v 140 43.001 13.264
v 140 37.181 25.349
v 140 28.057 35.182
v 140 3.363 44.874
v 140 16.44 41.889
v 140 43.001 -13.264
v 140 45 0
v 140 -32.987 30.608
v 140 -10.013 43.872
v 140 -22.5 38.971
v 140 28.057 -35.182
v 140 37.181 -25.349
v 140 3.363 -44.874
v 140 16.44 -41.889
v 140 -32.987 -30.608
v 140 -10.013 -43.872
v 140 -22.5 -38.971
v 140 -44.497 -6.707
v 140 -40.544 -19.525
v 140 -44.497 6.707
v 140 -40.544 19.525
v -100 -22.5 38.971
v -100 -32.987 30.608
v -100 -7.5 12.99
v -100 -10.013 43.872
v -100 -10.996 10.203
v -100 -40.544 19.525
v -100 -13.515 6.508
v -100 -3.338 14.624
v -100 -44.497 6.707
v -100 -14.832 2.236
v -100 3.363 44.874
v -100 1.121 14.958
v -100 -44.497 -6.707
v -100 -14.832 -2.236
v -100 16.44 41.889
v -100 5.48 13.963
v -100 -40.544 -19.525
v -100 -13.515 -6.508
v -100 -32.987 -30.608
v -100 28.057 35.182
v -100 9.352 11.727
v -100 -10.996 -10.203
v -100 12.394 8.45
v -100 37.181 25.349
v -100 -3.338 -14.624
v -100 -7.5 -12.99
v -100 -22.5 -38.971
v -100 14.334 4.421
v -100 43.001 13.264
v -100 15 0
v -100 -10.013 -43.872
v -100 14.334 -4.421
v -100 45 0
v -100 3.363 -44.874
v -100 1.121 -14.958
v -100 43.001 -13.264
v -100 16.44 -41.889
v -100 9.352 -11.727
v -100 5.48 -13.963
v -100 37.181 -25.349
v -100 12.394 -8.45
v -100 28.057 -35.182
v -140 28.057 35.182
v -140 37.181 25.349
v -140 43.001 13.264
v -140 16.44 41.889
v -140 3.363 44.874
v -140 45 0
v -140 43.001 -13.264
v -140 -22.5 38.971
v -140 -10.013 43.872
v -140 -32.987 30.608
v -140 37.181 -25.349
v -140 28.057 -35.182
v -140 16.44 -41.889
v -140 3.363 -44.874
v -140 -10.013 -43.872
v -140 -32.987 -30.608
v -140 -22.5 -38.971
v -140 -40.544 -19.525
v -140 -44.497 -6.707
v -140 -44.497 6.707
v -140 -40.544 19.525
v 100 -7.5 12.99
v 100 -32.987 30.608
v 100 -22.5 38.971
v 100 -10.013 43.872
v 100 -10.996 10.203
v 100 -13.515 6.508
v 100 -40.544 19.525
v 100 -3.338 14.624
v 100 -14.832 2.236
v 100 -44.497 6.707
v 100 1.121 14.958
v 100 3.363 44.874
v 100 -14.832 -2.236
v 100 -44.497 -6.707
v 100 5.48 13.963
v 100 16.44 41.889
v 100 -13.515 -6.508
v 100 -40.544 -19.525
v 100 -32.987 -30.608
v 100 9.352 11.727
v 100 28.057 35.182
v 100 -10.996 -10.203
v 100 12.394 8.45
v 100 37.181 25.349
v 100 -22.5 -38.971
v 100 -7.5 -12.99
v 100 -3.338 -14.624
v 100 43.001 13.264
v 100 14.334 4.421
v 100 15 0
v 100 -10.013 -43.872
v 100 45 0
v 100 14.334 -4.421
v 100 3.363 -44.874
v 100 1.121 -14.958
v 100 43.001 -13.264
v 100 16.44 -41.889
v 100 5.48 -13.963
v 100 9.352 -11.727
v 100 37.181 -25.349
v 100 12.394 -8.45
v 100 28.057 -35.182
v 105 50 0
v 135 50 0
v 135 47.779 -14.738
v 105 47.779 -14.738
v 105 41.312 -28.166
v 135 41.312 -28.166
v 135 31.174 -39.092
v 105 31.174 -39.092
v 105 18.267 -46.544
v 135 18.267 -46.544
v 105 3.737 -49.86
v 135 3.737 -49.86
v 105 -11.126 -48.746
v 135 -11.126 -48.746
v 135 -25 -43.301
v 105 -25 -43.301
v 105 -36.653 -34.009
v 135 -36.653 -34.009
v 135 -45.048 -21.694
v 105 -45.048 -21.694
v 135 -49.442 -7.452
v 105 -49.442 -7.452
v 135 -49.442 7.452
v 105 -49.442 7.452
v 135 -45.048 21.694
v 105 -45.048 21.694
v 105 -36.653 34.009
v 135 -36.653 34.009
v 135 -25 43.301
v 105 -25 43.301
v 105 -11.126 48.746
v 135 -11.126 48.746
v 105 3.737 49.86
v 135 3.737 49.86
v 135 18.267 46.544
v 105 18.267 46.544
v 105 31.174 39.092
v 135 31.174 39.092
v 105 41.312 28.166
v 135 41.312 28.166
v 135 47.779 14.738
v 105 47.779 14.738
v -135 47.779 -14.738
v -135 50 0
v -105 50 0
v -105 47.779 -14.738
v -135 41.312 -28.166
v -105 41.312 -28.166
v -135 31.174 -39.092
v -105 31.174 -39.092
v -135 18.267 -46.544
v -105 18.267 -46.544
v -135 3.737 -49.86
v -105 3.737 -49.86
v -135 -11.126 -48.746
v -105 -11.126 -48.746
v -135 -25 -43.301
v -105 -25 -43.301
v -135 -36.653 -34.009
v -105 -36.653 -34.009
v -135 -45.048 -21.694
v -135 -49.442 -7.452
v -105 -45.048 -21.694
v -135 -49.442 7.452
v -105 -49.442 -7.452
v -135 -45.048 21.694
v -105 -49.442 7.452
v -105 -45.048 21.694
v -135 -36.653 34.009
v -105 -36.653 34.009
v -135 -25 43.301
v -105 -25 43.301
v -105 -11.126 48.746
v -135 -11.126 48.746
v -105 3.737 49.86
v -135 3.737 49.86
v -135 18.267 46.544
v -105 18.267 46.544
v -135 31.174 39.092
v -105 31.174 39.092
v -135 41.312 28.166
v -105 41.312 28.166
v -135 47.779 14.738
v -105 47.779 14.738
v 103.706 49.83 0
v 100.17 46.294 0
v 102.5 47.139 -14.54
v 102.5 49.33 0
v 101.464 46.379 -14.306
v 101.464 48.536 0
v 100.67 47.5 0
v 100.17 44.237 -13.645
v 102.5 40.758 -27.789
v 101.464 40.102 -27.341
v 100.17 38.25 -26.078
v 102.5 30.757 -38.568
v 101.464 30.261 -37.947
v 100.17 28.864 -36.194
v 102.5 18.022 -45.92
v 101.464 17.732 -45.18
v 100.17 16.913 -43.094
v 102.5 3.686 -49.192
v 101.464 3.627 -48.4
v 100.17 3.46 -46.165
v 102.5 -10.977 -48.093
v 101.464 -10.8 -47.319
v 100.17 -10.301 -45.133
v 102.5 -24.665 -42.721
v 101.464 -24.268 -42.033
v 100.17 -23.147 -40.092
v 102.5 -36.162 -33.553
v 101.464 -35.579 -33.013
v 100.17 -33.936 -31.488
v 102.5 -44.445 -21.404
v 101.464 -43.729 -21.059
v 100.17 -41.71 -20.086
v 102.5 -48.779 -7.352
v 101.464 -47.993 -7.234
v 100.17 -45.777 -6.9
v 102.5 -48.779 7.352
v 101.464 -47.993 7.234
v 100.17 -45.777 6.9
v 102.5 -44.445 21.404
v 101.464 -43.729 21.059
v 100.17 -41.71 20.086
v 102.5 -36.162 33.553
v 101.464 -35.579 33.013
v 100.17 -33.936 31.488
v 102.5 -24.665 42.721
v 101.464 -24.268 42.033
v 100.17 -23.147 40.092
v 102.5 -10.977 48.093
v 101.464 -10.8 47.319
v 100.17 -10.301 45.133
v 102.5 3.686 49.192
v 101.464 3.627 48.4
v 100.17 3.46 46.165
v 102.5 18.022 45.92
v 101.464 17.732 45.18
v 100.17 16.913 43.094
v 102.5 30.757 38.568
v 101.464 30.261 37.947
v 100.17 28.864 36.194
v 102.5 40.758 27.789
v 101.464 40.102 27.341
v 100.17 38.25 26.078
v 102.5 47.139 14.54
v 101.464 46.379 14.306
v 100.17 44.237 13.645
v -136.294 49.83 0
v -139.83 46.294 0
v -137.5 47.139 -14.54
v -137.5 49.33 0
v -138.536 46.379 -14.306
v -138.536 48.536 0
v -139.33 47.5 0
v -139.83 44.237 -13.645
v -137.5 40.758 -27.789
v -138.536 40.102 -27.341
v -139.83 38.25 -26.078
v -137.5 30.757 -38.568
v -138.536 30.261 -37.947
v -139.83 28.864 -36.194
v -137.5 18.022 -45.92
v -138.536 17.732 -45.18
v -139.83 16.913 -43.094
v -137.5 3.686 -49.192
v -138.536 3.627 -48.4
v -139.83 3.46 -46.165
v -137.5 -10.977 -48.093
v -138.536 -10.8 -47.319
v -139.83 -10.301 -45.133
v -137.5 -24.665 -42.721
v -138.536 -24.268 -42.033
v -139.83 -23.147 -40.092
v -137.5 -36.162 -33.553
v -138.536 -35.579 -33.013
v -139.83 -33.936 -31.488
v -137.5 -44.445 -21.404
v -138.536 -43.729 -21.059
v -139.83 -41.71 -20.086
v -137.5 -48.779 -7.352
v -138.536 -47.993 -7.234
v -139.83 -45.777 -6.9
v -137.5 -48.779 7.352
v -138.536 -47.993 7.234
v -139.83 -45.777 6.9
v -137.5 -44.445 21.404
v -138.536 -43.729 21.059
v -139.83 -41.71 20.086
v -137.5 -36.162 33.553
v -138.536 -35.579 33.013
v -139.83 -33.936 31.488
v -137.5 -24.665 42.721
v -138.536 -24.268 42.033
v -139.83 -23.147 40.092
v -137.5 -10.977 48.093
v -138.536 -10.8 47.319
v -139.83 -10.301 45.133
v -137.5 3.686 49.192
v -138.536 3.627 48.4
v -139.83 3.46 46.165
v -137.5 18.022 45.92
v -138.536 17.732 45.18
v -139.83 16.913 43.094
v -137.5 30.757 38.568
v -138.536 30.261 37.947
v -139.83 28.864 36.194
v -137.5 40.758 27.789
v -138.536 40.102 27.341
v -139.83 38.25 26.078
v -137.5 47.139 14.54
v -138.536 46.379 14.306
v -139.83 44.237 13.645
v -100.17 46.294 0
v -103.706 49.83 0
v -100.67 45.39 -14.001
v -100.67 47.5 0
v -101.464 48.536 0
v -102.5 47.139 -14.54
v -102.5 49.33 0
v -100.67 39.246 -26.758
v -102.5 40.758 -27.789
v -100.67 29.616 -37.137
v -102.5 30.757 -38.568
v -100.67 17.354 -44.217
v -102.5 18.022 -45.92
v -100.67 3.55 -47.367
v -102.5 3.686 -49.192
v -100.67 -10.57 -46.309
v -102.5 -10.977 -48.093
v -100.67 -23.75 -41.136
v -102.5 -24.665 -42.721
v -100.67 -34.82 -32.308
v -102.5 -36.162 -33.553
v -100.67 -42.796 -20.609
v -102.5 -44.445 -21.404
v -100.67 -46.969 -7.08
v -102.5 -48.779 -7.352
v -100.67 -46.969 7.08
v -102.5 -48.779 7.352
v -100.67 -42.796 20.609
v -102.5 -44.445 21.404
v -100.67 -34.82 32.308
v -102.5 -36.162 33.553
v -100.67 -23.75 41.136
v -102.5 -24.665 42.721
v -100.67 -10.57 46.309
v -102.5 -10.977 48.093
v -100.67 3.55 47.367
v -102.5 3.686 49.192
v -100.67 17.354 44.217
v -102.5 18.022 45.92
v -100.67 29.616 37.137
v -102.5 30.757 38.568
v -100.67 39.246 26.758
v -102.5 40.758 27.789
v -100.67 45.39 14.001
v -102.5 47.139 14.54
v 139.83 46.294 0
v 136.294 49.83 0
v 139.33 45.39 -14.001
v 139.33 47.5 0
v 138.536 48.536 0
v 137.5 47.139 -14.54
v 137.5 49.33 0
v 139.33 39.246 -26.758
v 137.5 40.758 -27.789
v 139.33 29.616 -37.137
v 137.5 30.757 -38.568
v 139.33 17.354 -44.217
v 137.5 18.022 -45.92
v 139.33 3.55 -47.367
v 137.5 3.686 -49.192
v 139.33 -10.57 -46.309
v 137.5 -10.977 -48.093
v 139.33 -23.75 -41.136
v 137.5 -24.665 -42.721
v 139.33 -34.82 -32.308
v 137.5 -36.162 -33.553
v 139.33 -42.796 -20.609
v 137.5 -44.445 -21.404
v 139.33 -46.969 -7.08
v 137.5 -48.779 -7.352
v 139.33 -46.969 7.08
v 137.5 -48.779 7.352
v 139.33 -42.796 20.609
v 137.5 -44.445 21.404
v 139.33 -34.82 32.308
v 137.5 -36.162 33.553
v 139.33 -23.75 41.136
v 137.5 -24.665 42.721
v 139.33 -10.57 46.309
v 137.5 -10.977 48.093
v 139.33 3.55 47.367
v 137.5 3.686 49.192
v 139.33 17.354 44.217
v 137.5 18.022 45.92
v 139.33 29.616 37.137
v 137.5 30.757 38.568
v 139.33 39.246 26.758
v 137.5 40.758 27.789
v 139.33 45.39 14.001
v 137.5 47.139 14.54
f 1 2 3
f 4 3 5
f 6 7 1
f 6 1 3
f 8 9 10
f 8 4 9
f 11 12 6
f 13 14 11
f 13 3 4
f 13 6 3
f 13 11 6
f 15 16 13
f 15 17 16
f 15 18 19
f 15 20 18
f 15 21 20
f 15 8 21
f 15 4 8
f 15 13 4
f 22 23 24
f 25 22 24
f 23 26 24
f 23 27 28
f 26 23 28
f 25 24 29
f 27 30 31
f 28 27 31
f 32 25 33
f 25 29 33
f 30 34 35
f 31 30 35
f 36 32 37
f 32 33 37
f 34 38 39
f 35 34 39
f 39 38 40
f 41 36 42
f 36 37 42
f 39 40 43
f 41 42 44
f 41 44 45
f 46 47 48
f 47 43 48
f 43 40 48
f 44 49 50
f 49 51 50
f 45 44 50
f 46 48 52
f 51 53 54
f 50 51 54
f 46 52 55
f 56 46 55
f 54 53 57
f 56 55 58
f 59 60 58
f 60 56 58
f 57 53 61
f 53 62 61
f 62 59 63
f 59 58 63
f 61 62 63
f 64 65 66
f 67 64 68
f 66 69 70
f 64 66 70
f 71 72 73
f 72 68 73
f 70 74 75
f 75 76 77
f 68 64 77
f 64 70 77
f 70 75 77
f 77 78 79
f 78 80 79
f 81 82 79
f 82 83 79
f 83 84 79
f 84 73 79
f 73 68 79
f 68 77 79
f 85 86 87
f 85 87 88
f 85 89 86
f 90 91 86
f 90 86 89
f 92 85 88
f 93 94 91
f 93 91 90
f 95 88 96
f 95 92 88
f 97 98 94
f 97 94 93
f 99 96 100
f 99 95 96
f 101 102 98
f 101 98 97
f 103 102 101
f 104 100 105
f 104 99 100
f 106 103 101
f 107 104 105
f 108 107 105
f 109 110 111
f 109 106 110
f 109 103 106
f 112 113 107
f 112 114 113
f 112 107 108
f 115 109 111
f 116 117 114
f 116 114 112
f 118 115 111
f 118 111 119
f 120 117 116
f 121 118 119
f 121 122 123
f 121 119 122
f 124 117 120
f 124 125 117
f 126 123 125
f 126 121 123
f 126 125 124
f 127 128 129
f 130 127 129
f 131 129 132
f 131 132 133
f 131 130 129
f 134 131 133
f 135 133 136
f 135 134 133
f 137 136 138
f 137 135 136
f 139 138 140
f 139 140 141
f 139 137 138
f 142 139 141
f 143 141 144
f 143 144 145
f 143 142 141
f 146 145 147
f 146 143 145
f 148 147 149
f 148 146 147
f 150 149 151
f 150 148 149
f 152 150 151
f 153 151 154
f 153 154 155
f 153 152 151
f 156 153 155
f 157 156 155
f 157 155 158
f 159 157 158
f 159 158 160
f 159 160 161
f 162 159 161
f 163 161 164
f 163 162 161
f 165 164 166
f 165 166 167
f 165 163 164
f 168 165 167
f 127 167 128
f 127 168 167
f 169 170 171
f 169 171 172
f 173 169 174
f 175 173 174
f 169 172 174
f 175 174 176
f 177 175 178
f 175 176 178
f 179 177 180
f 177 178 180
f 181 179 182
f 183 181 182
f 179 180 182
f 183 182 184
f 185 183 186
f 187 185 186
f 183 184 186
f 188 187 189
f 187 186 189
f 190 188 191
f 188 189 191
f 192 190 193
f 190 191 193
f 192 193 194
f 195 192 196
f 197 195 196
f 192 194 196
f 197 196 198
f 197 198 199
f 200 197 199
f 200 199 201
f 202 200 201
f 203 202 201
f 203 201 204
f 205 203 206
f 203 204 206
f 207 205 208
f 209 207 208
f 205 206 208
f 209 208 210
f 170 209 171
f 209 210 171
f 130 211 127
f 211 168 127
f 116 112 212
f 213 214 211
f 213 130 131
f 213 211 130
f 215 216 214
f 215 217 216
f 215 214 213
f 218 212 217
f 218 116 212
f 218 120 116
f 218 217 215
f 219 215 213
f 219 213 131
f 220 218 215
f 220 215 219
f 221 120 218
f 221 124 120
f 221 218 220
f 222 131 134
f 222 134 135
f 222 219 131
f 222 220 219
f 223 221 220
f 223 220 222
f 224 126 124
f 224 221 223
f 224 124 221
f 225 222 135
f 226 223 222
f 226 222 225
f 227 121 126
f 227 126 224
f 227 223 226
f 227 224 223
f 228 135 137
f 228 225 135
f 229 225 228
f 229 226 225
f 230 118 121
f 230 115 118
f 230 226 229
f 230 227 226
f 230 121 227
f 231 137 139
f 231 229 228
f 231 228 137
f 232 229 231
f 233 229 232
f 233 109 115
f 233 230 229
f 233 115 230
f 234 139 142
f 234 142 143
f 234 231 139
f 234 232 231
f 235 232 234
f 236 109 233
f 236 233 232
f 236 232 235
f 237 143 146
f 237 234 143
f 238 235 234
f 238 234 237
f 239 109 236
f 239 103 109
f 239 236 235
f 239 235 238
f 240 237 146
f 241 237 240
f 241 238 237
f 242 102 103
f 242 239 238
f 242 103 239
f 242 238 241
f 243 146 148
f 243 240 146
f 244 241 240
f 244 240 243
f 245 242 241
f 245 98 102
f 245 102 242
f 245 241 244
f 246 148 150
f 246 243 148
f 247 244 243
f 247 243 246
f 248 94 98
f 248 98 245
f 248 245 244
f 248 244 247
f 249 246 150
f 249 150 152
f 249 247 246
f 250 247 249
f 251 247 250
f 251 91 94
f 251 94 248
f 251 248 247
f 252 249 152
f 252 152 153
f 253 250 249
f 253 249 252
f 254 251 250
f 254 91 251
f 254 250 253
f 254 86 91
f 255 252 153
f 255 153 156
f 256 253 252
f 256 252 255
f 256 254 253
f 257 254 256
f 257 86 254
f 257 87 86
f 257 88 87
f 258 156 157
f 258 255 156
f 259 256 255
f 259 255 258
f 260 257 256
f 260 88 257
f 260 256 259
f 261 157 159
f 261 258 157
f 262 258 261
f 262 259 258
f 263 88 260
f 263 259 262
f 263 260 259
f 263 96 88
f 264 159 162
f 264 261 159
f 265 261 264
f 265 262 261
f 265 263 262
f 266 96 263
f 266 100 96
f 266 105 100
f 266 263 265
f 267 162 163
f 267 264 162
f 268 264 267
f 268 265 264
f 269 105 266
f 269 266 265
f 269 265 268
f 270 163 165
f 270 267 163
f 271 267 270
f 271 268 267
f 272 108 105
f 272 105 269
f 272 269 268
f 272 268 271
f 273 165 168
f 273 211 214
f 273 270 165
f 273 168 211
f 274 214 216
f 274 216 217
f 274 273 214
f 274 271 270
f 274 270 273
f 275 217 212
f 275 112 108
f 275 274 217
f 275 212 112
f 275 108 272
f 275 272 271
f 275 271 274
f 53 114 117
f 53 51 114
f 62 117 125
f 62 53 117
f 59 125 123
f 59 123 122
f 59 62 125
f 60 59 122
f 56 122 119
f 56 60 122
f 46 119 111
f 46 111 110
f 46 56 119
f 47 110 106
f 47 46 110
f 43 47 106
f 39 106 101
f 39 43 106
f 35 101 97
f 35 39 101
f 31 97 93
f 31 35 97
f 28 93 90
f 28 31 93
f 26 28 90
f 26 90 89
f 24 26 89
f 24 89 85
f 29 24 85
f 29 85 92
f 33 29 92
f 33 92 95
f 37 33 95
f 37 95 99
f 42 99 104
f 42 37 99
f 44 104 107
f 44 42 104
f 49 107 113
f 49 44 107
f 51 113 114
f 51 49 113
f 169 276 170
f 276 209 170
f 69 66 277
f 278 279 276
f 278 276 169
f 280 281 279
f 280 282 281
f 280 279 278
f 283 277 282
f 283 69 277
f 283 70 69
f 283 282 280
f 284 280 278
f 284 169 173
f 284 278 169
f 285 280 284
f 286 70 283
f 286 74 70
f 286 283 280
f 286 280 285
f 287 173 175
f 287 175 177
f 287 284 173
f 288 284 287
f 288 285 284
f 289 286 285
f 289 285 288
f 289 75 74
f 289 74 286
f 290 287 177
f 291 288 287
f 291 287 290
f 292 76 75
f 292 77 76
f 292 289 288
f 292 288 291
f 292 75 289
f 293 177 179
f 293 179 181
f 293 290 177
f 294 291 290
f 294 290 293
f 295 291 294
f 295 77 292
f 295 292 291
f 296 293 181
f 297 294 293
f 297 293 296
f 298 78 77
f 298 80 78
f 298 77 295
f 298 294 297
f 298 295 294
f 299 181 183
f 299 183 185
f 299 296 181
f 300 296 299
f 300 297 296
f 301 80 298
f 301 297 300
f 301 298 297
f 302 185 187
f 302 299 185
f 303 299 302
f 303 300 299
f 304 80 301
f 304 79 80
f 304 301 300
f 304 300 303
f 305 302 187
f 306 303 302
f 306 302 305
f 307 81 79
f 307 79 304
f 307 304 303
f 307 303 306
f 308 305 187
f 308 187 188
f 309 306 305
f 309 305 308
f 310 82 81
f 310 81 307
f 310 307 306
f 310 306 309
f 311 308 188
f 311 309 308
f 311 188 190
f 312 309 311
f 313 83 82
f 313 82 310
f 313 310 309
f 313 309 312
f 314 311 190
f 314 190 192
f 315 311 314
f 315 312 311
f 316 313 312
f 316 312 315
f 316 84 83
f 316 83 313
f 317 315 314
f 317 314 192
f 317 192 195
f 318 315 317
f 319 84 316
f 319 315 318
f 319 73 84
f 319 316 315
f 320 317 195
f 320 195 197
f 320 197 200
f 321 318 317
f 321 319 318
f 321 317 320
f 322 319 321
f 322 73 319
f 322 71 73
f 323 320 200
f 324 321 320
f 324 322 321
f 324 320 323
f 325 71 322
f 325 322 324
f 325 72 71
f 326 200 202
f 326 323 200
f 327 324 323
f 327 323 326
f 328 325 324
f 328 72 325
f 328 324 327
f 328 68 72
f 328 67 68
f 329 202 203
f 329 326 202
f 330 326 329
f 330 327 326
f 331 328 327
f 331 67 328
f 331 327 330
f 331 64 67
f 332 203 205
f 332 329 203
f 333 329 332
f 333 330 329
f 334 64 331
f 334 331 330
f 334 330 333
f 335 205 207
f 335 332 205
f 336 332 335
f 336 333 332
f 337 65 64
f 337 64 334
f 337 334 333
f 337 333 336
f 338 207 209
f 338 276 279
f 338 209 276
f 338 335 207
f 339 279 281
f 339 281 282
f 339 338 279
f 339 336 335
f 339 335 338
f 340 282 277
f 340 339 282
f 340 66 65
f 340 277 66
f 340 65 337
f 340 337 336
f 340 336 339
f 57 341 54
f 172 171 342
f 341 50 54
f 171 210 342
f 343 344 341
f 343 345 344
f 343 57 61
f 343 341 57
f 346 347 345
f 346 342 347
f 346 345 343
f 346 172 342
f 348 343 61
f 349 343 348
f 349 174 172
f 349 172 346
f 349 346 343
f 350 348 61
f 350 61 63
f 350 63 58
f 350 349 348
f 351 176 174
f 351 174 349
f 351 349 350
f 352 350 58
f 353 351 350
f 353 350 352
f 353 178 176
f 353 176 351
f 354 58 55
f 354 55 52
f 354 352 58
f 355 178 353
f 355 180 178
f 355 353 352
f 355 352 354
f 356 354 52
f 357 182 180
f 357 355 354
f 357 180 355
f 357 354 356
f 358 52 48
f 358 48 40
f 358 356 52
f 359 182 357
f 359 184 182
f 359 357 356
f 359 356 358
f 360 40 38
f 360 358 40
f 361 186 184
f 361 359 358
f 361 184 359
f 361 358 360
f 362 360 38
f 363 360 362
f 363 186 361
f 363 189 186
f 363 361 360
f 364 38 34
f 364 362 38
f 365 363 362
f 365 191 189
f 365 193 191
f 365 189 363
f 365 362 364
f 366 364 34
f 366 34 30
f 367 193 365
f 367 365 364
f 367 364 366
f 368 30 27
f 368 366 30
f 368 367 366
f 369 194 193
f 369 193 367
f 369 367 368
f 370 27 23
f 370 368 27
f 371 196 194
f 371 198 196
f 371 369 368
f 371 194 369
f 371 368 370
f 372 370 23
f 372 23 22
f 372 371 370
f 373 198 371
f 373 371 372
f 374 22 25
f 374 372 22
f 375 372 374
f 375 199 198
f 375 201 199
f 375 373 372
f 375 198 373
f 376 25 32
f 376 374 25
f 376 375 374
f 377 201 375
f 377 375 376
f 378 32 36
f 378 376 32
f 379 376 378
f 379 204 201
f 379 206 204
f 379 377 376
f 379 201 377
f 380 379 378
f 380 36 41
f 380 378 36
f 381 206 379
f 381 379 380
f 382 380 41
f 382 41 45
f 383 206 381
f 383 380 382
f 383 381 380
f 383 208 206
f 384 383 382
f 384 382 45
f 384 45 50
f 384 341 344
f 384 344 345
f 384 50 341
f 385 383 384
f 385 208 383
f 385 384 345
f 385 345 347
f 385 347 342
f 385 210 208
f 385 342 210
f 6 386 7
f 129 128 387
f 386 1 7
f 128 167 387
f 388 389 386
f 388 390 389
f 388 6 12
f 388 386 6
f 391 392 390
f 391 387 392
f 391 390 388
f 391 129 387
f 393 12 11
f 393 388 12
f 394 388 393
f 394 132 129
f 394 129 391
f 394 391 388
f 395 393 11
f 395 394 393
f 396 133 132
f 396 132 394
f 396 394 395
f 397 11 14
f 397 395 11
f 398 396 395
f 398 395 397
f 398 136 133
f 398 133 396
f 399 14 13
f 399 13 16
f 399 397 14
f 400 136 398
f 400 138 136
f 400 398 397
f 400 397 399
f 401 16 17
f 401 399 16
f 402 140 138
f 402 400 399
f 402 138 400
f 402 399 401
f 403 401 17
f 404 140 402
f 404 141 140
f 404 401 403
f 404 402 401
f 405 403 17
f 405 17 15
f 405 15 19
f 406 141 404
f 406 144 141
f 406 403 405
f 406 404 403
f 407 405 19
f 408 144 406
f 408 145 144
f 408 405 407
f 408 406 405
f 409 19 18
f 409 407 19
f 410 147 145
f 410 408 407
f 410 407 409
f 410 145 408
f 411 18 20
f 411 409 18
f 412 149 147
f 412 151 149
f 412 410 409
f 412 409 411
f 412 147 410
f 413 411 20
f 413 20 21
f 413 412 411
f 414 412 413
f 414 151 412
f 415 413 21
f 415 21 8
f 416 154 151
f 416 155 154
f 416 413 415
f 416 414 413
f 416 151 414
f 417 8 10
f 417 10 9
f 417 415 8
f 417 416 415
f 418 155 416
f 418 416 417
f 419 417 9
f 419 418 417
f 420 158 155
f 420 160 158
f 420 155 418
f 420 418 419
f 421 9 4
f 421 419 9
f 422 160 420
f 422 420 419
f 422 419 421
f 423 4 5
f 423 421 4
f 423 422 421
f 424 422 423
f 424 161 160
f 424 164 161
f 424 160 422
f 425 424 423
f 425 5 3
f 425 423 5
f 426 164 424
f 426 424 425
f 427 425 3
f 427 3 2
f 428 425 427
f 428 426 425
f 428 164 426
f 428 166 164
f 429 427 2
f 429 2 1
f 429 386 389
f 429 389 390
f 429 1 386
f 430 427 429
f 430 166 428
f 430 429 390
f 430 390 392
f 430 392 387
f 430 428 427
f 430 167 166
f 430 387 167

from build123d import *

# Parameters (mm, degrees)
CONG_1_R = 5


with BuildPart() as part:
    # Esquisse1 → Révolution1 (revolve)
    with BuildSketch(Plane.XY):
        Polygon((0, 0), (-140, 0), (-140, 50), (-100, 50), (-100, 15), (0, 15), align=None)
    r_volution1 = revolve(axis=Axis((0, 0, 0), (-1, 0, 0)))

    # Symétrie1: Révolution1 across plane
    add(r_volution1.mirror(Plane(origin=(0, 0, 0), x_dir=(0, 0, 1), z_dir=(1, 0, 0))))

    # Congé1
    cong_1_edges = [part.edges().sort_by_distance(p)[0] for p in [
        (100, -50, 0),
        (140, -50, 0),
        (-140, -50, 0),
        (-100, -50, 0),
    ]]
    fillet(cong_1_edges, radius=CONG_1_R)


solid = part.part
